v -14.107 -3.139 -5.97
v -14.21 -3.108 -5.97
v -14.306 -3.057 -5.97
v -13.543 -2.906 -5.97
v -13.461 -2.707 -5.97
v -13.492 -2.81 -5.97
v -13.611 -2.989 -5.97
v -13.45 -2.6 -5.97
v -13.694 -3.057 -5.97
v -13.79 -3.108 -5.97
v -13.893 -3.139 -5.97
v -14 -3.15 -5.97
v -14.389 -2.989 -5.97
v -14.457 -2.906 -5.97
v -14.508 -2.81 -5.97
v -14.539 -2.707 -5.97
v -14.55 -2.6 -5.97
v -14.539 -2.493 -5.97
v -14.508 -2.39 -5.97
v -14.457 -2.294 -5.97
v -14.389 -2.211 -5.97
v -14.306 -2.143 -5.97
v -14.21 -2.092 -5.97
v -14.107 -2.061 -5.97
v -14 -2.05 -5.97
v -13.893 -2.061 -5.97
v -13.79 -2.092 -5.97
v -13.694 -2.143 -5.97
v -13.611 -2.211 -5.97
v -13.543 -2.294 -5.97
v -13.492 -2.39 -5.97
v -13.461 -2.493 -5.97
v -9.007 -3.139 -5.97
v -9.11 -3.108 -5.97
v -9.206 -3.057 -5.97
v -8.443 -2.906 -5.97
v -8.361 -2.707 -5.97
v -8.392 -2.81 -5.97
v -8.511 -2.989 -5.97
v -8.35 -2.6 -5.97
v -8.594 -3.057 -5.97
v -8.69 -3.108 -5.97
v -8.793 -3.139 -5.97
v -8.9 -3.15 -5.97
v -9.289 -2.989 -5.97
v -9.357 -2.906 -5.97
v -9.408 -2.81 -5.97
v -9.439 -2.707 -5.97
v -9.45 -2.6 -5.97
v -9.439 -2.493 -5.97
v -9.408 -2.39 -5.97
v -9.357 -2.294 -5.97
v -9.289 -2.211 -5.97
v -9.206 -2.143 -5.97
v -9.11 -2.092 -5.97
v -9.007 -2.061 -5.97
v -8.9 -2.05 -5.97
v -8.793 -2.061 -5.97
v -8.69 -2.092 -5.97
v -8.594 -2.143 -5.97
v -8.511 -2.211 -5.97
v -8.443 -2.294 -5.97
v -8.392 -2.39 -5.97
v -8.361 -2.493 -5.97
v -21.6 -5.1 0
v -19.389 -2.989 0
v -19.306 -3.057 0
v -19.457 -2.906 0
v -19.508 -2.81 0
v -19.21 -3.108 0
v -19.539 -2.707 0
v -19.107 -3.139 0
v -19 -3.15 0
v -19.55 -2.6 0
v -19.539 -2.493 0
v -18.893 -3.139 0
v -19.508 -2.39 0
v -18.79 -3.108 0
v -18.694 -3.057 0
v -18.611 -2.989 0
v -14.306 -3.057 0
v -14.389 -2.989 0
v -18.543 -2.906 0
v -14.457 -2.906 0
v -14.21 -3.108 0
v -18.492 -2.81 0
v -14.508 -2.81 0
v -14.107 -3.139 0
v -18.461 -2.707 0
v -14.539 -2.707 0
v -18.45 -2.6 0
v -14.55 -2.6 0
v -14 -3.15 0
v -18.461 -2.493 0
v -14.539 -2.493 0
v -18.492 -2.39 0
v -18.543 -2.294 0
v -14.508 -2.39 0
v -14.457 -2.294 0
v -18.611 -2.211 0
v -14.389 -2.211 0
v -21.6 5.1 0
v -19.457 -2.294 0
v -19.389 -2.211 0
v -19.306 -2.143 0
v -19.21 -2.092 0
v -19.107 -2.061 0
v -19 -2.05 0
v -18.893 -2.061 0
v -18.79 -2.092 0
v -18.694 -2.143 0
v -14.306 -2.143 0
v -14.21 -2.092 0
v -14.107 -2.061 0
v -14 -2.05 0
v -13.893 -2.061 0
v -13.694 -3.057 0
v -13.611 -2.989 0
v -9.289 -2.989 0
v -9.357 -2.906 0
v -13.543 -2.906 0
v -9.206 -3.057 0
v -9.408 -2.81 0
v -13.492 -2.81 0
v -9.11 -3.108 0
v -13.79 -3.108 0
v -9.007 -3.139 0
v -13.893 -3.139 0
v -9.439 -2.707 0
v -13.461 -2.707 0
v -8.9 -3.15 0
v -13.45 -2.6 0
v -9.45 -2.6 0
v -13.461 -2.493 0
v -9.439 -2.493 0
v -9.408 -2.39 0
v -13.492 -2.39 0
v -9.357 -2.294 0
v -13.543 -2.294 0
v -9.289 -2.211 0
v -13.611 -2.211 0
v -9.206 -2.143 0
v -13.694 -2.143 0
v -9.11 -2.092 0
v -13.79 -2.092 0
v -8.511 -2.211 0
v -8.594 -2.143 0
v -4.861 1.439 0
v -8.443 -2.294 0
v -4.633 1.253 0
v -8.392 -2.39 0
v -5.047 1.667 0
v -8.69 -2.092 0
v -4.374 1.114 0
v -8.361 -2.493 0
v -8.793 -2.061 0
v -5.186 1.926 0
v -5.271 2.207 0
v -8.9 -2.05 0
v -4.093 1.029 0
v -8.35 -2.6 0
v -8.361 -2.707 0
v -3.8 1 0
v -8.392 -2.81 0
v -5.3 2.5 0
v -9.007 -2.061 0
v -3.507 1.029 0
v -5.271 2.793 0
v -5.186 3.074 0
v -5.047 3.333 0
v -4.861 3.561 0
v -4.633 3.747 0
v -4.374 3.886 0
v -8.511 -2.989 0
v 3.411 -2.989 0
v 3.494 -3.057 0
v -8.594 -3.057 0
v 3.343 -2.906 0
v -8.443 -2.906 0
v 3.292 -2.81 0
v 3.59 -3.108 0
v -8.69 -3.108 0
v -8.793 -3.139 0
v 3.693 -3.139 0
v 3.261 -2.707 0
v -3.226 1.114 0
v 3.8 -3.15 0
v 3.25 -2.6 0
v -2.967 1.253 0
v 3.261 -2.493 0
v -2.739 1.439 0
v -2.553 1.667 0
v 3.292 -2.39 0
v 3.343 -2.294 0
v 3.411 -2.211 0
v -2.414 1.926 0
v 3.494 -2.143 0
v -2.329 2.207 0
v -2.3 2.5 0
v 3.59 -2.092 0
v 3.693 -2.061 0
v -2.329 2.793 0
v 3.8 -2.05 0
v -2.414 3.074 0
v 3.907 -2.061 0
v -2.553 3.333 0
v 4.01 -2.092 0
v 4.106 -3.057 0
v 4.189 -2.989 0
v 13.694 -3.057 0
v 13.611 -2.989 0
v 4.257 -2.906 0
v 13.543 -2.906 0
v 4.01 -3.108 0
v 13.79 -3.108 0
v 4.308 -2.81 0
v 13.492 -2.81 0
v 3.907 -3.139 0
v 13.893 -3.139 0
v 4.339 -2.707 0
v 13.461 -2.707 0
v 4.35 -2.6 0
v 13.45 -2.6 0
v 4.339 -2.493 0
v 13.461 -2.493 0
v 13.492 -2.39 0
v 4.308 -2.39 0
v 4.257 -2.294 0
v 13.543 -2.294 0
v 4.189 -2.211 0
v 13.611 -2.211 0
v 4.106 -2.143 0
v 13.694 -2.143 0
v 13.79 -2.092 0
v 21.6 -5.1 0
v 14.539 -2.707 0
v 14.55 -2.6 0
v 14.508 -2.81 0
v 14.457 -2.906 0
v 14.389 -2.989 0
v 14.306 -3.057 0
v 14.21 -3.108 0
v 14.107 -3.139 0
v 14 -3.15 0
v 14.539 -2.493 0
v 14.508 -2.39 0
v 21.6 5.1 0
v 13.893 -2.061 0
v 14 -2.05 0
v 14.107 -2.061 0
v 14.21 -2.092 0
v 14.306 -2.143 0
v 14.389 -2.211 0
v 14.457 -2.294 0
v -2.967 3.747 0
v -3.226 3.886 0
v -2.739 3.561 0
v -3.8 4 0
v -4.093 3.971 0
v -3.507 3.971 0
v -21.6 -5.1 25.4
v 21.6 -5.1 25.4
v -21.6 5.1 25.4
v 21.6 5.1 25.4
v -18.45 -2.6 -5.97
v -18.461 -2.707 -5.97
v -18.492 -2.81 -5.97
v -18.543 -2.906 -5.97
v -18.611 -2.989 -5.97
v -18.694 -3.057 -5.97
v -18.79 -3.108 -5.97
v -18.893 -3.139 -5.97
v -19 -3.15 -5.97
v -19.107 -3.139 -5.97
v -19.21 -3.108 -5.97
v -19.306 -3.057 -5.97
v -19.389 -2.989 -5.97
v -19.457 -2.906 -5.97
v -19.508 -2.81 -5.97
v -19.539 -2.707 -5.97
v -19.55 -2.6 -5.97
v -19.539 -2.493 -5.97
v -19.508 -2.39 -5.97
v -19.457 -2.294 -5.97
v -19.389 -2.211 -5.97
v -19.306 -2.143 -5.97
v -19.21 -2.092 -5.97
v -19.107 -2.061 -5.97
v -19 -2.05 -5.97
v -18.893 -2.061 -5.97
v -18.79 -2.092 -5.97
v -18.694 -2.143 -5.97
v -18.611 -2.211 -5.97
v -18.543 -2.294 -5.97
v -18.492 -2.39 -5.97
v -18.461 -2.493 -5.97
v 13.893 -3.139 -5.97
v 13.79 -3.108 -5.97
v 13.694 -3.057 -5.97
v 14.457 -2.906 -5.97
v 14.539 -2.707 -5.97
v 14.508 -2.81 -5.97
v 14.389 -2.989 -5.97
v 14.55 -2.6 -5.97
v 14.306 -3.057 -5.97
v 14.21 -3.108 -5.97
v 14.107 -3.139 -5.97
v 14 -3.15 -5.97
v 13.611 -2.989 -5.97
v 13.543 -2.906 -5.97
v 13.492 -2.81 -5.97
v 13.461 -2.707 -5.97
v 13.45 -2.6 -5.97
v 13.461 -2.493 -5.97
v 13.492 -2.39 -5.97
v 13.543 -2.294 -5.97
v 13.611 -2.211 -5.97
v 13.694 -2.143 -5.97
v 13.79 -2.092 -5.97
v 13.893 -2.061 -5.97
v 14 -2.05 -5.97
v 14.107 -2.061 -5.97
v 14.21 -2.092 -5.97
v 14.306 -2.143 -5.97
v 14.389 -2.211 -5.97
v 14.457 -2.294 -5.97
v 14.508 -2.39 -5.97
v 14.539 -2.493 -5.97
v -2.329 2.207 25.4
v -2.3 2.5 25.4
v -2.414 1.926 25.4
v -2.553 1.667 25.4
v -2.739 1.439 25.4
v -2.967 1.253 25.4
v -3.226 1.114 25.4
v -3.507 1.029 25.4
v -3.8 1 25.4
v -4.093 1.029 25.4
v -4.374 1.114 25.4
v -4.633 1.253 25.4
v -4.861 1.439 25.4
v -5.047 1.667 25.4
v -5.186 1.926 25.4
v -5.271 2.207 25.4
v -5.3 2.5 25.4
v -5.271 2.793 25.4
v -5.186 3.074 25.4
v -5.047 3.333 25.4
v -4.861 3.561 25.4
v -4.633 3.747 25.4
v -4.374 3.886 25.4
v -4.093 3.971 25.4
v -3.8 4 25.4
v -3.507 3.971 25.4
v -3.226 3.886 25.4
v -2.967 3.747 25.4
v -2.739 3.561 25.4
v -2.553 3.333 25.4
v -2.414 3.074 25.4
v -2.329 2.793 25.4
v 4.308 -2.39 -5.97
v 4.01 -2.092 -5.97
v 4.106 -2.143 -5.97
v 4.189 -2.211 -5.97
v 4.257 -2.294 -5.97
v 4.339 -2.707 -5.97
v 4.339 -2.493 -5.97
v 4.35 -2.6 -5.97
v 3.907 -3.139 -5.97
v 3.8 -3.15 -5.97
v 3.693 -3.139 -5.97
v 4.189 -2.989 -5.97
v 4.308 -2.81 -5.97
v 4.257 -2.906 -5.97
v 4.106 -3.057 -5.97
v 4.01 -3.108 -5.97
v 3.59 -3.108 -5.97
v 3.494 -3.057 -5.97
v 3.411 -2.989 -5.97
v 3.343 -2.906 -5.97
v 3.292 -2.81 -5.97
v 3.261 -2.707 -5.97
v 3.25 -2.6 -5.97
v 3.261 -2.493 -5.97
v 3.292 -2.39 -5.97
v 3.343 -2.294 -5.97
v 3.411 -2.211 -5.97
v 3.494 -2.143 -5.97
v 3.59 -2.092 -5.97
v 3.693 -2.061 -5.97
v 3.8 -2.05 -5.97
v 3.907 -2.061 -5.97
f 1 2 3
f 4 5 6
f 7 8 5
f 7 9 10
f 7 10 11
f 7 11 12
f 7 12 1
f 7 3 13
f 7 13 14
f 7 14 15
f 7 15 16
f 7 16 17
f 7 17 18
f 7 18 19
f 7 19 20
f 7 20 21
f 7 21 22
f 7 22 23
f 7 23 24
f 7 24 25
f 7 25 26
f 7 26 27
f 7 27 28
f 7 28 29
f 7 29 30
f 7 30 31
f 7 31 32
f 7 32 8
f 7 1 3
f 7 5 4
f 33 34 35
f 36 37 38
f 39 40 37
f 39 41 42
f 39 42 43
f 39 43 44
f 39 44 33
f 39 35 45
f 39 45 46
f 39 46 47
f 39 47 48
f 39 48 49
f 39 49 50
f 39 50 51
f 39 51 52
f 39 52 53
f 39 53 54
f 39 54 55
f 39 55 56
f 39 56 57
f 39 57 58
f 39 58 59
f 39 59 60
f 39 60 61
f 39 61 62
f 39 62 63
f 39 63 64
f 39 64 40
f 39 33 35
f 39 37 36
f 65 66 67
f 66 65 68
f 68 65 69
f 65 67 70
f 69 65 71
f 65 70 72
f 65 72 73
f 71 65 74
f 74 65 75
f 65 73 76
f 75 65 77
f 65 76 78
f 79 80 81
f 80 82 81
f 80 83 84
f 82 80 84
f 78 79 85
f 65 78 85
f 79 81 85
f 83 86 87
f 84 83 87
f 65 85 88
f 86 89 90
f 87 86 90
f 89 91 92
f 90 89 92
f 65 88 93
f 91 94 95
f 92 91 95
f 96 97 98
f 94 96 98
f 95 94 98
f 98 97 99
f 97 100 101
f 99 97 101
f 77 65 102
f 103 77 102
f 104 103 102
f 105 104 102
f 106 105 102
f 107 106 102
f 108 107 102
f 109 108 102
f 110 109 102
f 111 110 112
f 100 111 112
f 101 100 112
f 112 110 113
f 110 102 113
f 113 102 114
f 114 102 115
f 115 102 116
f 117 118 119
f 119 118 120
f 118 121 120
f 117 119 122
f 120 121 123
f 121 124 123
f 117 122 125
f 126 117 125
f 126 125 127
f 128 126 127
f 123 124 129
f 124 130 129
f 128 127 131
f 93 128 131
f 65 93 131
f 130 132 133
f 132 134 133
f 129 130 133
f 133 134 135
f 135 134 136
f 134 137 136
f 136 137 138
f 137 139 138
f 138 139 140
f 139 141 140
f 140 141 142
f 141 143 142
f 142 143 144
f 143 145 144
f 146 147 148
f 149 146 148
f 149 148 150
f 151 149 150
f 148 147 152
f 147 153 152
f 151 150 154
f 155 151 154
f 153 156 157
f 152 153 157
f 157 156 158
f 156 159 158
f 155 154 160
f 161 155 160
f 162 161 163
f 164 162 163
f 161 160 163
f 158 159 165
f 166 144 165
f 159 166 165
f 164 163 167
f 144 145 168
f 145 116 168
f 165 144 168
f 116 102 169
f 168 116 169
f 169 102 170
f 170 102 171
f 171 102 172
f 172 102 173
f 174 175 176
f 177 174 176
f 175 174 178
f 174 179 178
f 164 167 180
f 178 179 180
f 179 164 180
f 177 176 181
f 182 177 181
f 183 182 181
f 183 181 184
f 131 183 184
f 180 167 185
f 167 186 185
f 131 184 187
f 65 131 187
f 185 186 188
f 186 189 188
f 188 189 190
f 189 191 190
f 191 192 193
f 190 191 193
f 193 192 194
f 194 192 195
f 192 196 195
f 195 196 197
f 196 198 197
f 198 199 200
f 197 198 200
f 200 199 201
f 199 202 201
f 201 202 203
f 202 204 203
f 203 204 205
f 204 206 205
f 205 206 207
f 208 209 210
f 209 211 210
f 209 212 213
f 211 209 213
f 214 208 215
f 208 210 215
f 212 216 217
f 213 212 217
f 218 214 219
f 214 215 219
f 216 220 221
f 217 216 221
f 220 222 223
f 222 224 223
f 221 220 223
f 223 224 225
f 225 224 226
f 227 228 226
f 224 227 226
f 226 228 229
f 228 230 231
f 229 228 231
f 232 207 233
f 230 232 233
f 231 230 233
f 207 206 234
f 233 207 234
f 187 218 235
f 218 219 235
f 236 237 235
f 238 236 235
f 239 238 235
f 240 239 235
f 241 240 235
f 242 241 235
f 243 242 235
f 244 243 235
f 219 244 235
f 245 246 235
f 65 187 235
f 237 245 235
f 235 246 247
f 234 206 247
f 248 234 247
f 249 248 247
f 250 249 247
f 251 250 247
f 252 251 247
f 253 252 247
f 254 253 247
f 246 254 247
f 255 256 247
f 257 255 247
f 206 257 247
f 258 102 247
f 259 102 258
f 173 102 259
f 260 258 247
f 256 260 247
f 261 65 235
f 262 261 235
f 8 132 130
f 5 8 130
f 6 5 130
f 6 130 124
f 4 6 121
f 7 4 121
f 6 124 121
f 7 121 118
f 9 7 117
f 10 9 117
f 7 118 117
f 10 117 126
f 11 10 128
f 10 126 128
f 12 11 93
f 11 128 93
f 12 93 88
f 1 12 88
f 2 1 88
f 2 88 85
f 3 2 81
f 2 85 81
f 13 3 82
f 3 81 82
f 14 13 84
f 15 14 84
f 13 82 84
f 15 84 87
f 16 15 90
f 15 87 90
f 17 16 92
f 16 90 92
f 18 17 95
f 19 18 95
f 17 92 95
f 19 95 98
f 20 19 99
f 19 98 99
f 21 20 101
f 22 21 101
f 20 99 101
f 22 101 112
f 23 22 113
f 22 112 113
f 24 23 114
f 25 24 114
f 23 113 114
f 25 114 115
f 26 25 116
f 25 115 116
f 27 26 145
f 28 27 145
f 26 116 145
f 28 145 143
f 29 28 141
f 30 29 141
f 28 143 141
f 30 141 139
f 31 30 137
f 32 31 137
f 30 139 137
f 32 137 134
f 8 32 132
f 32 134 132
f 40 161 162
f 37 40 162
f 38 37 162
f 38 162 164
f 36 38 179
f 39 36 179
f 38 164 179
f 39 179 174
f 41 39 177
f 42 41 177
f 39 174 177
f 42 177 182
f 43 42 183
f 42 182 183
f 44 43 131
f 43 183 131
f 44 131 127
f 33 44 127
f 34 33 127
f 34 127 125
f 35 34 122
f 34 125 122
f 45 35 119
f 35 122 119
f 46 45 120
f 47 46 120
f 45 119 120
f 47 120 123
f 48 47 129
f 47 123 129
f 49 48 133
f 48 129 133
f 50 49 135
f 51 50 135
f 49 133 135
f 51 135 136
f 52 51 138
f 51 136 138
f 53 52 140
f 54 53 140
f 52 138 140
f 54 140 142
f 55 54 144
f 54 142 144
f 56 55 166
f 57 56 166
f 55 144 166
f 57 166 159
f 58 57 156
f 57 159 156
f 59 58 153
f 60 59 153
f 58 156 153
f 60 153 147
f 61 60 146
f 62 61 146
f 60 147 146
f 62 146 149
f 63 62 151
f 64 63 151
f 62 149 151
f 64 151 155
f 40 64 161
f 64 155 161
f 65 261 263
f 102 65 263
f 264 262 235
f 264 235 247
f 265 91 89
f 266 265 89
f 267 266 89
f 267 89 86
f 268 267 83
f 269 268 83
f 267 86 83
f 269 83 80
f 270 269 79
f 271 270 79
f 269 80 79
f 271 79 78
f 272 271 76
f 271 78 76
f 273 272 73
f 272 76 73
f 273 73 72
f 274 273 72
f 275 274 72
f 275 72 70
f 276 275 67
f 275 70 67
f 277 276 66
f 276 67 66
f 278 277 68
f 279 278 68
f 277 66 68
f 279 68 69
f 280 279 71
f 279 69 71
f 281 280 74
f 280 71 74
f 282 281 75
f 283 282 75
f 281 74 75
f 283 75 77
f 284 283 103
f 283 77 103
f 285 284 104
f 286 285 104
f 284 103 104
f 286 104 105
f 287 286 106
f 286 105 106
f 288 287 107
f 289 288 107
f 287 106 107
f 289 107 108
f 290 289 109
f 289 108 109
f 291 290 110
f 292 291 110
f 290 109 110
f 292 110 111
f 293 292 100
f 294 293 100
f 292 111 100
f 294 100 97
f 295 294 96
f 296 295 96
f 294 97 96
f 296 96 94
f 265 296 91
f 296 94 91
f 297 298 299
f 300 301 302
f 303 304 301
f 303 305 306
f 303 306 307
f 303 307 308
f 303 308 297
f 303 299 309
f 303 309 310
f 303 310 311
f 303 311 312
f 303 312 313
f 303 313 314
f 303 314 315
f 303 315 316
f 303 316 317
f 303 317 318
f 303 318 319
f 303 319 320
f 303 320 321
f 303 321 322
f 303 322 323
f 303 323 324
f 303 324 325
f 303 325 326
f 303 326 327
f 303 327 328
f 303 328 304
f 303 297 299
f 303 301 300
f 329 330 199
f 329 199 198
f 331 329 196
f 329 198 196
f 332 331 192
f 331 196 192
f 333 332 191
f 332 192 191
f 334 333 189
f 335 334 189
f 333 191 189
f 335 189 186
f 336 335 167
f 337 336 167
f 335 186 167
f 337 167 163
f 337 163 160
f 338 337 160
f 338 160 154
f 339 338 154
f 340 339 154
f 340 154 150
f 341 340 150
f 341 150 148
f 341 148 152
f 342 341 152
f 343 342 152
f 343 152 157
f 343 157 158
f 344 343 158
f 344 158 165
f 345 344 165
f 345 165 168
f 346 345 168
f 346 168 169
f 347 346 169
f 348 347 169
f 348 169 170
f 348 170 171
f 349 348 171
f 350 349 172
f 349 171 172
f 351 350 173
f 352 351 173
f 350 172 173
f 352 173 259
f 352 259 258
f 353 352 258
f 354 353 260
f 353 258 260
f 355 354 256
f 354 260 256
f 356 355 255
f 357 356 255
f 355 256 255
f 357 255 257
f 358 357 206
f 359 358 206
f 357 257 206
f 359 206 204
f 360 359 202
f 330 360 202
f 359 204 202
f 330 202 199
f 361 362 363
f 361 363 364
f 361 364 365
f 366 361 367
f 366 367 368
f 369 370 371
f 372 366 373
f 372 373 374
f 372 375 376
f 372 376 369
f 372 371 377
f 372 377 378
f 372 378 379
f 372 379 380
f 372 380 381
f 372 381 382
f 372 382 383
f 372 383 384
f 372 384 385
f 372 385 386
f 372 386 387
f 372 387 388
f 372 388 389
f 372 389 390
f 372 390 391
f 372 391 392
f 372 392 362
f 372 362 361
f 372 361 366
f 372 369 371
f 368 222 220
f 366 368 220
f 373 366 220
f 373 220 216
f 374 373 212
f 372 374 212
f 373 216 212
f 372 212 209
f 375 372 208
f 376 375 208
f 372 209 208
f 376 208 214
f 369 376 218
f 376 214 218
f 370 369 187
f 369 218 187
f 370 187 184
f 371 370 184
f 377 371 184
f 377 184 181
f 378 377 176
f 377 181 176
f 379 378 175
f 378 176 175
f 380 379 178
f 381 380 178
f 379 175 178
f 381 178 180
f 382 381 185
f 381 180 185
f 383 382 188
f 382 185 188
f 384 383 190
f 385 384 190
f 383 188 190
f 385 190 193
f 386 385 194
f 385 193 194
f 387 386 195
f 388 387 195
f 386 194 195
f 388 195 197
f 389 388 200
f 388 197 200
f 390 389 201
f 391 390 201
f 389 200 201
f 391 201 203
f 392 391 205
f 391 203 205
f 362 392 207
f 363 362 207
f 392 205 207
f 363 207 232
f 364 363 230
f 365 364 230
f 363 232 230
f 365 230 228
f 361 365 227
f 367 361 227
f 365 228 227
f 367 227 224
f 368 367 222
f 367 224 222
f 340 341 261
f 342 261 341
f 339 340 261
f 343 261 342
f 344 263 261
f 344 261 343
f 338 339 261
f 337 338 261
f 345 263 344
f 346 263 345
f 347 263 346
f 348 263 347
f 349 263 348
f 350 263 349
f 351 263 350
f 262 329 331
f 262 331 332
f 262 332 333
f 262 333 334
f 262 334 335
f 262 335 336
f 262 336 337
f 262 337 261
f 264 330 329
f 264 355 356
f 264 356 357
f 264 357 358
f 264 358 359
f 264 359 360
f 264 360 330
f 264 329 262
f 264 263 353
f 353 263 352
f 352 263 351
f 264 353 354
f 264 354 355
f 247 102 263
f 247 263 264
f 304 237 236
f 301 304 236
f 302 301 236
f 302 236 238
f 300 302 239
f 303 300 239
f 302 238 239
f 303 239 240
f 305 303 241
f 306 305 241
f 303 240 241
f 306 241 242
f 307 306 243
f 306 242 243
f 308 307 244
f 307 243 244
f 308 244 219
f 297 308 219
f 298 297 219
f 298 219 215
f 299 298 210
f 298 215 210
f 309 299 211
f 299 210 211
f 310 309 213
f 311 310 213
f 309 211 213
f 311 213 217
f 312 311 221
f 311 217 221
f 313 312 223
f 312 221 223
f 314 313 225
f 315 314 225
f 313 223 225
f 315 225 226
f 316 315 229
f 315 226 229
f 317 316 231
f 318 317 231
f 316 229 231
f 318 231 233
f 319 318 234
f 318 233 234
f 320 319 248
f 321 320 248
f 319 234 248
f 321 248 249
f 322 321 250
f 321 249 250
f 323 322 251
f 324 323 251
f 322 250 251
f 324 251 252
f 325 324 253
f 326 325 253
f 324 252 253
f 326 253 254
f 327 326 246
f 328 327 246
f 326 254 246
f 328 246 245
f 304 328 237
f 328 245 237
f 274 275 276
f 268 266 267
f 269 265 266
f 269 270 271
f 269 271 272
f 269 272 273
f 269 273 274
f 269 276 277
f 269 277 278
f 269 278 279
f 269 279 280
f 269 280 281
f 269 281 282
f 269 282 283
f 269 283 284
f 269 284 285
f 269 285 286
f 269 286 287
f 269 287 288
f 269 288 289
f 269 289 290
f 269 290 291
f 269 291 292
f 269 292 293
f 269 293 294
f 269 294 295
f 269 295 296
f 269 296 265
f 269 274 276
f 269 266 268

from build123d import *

# Parameters (mm, degrees)
SKETCH_W     = 43.2
SKETCH_H     = 10.2
PAD_DEPTH    = 25.4
SKETCH001_R  = 0.55
PAD001_DEPTH = 5.97
SKETCH002_R  = 1.5
POCKET_DEPTH = 25.401


with BuildPart() as part:
    # Sketch → Pad (new body)
    with BuildSketch(Plane.XY):
        Rectangle(SKETCH_W, SKETCH_H)
    extrude(amount=PAD_DEPTH)

    # Sketch001 (on Face5 of Pad) → Pad001 (join)
    with BuildSketch(Plane(origin=(0, 0, 0), x_dir=(1, 0, 0), z_dir=(0, 0, -1))):
        with Locations((14, 2.6)):
            Circle(SKETCH001_R)
        with Locations((3.8, 2.6)):
            Circle(SKETCH001_R)
        with Locations((-8.9, 2.6)):
            Circle(SKETCH001_R)
        with Locations((-14, 2.6)):
            Circle(SKETCH001_R)
        with Locations((-19, 2.6)):
            Circle(SKETCH001_R)
    extrude(amount=PAD001_DEPTH)

    # Sketch002 (on Face4 of Pad001) → Pocket (cut, through all)
    with BuildSketch(Plane(origin=(0, 0, 0), x_dir=(1, 0, 0), z_dir=(0, 0, -1))):
        with Locations((-3.8, -2.5)):
            Circle(SKETCH002_R)
    extrude(amount=-POCKET_DEPTH, mode=Mode.SUBTRACT)


solid = part.part
